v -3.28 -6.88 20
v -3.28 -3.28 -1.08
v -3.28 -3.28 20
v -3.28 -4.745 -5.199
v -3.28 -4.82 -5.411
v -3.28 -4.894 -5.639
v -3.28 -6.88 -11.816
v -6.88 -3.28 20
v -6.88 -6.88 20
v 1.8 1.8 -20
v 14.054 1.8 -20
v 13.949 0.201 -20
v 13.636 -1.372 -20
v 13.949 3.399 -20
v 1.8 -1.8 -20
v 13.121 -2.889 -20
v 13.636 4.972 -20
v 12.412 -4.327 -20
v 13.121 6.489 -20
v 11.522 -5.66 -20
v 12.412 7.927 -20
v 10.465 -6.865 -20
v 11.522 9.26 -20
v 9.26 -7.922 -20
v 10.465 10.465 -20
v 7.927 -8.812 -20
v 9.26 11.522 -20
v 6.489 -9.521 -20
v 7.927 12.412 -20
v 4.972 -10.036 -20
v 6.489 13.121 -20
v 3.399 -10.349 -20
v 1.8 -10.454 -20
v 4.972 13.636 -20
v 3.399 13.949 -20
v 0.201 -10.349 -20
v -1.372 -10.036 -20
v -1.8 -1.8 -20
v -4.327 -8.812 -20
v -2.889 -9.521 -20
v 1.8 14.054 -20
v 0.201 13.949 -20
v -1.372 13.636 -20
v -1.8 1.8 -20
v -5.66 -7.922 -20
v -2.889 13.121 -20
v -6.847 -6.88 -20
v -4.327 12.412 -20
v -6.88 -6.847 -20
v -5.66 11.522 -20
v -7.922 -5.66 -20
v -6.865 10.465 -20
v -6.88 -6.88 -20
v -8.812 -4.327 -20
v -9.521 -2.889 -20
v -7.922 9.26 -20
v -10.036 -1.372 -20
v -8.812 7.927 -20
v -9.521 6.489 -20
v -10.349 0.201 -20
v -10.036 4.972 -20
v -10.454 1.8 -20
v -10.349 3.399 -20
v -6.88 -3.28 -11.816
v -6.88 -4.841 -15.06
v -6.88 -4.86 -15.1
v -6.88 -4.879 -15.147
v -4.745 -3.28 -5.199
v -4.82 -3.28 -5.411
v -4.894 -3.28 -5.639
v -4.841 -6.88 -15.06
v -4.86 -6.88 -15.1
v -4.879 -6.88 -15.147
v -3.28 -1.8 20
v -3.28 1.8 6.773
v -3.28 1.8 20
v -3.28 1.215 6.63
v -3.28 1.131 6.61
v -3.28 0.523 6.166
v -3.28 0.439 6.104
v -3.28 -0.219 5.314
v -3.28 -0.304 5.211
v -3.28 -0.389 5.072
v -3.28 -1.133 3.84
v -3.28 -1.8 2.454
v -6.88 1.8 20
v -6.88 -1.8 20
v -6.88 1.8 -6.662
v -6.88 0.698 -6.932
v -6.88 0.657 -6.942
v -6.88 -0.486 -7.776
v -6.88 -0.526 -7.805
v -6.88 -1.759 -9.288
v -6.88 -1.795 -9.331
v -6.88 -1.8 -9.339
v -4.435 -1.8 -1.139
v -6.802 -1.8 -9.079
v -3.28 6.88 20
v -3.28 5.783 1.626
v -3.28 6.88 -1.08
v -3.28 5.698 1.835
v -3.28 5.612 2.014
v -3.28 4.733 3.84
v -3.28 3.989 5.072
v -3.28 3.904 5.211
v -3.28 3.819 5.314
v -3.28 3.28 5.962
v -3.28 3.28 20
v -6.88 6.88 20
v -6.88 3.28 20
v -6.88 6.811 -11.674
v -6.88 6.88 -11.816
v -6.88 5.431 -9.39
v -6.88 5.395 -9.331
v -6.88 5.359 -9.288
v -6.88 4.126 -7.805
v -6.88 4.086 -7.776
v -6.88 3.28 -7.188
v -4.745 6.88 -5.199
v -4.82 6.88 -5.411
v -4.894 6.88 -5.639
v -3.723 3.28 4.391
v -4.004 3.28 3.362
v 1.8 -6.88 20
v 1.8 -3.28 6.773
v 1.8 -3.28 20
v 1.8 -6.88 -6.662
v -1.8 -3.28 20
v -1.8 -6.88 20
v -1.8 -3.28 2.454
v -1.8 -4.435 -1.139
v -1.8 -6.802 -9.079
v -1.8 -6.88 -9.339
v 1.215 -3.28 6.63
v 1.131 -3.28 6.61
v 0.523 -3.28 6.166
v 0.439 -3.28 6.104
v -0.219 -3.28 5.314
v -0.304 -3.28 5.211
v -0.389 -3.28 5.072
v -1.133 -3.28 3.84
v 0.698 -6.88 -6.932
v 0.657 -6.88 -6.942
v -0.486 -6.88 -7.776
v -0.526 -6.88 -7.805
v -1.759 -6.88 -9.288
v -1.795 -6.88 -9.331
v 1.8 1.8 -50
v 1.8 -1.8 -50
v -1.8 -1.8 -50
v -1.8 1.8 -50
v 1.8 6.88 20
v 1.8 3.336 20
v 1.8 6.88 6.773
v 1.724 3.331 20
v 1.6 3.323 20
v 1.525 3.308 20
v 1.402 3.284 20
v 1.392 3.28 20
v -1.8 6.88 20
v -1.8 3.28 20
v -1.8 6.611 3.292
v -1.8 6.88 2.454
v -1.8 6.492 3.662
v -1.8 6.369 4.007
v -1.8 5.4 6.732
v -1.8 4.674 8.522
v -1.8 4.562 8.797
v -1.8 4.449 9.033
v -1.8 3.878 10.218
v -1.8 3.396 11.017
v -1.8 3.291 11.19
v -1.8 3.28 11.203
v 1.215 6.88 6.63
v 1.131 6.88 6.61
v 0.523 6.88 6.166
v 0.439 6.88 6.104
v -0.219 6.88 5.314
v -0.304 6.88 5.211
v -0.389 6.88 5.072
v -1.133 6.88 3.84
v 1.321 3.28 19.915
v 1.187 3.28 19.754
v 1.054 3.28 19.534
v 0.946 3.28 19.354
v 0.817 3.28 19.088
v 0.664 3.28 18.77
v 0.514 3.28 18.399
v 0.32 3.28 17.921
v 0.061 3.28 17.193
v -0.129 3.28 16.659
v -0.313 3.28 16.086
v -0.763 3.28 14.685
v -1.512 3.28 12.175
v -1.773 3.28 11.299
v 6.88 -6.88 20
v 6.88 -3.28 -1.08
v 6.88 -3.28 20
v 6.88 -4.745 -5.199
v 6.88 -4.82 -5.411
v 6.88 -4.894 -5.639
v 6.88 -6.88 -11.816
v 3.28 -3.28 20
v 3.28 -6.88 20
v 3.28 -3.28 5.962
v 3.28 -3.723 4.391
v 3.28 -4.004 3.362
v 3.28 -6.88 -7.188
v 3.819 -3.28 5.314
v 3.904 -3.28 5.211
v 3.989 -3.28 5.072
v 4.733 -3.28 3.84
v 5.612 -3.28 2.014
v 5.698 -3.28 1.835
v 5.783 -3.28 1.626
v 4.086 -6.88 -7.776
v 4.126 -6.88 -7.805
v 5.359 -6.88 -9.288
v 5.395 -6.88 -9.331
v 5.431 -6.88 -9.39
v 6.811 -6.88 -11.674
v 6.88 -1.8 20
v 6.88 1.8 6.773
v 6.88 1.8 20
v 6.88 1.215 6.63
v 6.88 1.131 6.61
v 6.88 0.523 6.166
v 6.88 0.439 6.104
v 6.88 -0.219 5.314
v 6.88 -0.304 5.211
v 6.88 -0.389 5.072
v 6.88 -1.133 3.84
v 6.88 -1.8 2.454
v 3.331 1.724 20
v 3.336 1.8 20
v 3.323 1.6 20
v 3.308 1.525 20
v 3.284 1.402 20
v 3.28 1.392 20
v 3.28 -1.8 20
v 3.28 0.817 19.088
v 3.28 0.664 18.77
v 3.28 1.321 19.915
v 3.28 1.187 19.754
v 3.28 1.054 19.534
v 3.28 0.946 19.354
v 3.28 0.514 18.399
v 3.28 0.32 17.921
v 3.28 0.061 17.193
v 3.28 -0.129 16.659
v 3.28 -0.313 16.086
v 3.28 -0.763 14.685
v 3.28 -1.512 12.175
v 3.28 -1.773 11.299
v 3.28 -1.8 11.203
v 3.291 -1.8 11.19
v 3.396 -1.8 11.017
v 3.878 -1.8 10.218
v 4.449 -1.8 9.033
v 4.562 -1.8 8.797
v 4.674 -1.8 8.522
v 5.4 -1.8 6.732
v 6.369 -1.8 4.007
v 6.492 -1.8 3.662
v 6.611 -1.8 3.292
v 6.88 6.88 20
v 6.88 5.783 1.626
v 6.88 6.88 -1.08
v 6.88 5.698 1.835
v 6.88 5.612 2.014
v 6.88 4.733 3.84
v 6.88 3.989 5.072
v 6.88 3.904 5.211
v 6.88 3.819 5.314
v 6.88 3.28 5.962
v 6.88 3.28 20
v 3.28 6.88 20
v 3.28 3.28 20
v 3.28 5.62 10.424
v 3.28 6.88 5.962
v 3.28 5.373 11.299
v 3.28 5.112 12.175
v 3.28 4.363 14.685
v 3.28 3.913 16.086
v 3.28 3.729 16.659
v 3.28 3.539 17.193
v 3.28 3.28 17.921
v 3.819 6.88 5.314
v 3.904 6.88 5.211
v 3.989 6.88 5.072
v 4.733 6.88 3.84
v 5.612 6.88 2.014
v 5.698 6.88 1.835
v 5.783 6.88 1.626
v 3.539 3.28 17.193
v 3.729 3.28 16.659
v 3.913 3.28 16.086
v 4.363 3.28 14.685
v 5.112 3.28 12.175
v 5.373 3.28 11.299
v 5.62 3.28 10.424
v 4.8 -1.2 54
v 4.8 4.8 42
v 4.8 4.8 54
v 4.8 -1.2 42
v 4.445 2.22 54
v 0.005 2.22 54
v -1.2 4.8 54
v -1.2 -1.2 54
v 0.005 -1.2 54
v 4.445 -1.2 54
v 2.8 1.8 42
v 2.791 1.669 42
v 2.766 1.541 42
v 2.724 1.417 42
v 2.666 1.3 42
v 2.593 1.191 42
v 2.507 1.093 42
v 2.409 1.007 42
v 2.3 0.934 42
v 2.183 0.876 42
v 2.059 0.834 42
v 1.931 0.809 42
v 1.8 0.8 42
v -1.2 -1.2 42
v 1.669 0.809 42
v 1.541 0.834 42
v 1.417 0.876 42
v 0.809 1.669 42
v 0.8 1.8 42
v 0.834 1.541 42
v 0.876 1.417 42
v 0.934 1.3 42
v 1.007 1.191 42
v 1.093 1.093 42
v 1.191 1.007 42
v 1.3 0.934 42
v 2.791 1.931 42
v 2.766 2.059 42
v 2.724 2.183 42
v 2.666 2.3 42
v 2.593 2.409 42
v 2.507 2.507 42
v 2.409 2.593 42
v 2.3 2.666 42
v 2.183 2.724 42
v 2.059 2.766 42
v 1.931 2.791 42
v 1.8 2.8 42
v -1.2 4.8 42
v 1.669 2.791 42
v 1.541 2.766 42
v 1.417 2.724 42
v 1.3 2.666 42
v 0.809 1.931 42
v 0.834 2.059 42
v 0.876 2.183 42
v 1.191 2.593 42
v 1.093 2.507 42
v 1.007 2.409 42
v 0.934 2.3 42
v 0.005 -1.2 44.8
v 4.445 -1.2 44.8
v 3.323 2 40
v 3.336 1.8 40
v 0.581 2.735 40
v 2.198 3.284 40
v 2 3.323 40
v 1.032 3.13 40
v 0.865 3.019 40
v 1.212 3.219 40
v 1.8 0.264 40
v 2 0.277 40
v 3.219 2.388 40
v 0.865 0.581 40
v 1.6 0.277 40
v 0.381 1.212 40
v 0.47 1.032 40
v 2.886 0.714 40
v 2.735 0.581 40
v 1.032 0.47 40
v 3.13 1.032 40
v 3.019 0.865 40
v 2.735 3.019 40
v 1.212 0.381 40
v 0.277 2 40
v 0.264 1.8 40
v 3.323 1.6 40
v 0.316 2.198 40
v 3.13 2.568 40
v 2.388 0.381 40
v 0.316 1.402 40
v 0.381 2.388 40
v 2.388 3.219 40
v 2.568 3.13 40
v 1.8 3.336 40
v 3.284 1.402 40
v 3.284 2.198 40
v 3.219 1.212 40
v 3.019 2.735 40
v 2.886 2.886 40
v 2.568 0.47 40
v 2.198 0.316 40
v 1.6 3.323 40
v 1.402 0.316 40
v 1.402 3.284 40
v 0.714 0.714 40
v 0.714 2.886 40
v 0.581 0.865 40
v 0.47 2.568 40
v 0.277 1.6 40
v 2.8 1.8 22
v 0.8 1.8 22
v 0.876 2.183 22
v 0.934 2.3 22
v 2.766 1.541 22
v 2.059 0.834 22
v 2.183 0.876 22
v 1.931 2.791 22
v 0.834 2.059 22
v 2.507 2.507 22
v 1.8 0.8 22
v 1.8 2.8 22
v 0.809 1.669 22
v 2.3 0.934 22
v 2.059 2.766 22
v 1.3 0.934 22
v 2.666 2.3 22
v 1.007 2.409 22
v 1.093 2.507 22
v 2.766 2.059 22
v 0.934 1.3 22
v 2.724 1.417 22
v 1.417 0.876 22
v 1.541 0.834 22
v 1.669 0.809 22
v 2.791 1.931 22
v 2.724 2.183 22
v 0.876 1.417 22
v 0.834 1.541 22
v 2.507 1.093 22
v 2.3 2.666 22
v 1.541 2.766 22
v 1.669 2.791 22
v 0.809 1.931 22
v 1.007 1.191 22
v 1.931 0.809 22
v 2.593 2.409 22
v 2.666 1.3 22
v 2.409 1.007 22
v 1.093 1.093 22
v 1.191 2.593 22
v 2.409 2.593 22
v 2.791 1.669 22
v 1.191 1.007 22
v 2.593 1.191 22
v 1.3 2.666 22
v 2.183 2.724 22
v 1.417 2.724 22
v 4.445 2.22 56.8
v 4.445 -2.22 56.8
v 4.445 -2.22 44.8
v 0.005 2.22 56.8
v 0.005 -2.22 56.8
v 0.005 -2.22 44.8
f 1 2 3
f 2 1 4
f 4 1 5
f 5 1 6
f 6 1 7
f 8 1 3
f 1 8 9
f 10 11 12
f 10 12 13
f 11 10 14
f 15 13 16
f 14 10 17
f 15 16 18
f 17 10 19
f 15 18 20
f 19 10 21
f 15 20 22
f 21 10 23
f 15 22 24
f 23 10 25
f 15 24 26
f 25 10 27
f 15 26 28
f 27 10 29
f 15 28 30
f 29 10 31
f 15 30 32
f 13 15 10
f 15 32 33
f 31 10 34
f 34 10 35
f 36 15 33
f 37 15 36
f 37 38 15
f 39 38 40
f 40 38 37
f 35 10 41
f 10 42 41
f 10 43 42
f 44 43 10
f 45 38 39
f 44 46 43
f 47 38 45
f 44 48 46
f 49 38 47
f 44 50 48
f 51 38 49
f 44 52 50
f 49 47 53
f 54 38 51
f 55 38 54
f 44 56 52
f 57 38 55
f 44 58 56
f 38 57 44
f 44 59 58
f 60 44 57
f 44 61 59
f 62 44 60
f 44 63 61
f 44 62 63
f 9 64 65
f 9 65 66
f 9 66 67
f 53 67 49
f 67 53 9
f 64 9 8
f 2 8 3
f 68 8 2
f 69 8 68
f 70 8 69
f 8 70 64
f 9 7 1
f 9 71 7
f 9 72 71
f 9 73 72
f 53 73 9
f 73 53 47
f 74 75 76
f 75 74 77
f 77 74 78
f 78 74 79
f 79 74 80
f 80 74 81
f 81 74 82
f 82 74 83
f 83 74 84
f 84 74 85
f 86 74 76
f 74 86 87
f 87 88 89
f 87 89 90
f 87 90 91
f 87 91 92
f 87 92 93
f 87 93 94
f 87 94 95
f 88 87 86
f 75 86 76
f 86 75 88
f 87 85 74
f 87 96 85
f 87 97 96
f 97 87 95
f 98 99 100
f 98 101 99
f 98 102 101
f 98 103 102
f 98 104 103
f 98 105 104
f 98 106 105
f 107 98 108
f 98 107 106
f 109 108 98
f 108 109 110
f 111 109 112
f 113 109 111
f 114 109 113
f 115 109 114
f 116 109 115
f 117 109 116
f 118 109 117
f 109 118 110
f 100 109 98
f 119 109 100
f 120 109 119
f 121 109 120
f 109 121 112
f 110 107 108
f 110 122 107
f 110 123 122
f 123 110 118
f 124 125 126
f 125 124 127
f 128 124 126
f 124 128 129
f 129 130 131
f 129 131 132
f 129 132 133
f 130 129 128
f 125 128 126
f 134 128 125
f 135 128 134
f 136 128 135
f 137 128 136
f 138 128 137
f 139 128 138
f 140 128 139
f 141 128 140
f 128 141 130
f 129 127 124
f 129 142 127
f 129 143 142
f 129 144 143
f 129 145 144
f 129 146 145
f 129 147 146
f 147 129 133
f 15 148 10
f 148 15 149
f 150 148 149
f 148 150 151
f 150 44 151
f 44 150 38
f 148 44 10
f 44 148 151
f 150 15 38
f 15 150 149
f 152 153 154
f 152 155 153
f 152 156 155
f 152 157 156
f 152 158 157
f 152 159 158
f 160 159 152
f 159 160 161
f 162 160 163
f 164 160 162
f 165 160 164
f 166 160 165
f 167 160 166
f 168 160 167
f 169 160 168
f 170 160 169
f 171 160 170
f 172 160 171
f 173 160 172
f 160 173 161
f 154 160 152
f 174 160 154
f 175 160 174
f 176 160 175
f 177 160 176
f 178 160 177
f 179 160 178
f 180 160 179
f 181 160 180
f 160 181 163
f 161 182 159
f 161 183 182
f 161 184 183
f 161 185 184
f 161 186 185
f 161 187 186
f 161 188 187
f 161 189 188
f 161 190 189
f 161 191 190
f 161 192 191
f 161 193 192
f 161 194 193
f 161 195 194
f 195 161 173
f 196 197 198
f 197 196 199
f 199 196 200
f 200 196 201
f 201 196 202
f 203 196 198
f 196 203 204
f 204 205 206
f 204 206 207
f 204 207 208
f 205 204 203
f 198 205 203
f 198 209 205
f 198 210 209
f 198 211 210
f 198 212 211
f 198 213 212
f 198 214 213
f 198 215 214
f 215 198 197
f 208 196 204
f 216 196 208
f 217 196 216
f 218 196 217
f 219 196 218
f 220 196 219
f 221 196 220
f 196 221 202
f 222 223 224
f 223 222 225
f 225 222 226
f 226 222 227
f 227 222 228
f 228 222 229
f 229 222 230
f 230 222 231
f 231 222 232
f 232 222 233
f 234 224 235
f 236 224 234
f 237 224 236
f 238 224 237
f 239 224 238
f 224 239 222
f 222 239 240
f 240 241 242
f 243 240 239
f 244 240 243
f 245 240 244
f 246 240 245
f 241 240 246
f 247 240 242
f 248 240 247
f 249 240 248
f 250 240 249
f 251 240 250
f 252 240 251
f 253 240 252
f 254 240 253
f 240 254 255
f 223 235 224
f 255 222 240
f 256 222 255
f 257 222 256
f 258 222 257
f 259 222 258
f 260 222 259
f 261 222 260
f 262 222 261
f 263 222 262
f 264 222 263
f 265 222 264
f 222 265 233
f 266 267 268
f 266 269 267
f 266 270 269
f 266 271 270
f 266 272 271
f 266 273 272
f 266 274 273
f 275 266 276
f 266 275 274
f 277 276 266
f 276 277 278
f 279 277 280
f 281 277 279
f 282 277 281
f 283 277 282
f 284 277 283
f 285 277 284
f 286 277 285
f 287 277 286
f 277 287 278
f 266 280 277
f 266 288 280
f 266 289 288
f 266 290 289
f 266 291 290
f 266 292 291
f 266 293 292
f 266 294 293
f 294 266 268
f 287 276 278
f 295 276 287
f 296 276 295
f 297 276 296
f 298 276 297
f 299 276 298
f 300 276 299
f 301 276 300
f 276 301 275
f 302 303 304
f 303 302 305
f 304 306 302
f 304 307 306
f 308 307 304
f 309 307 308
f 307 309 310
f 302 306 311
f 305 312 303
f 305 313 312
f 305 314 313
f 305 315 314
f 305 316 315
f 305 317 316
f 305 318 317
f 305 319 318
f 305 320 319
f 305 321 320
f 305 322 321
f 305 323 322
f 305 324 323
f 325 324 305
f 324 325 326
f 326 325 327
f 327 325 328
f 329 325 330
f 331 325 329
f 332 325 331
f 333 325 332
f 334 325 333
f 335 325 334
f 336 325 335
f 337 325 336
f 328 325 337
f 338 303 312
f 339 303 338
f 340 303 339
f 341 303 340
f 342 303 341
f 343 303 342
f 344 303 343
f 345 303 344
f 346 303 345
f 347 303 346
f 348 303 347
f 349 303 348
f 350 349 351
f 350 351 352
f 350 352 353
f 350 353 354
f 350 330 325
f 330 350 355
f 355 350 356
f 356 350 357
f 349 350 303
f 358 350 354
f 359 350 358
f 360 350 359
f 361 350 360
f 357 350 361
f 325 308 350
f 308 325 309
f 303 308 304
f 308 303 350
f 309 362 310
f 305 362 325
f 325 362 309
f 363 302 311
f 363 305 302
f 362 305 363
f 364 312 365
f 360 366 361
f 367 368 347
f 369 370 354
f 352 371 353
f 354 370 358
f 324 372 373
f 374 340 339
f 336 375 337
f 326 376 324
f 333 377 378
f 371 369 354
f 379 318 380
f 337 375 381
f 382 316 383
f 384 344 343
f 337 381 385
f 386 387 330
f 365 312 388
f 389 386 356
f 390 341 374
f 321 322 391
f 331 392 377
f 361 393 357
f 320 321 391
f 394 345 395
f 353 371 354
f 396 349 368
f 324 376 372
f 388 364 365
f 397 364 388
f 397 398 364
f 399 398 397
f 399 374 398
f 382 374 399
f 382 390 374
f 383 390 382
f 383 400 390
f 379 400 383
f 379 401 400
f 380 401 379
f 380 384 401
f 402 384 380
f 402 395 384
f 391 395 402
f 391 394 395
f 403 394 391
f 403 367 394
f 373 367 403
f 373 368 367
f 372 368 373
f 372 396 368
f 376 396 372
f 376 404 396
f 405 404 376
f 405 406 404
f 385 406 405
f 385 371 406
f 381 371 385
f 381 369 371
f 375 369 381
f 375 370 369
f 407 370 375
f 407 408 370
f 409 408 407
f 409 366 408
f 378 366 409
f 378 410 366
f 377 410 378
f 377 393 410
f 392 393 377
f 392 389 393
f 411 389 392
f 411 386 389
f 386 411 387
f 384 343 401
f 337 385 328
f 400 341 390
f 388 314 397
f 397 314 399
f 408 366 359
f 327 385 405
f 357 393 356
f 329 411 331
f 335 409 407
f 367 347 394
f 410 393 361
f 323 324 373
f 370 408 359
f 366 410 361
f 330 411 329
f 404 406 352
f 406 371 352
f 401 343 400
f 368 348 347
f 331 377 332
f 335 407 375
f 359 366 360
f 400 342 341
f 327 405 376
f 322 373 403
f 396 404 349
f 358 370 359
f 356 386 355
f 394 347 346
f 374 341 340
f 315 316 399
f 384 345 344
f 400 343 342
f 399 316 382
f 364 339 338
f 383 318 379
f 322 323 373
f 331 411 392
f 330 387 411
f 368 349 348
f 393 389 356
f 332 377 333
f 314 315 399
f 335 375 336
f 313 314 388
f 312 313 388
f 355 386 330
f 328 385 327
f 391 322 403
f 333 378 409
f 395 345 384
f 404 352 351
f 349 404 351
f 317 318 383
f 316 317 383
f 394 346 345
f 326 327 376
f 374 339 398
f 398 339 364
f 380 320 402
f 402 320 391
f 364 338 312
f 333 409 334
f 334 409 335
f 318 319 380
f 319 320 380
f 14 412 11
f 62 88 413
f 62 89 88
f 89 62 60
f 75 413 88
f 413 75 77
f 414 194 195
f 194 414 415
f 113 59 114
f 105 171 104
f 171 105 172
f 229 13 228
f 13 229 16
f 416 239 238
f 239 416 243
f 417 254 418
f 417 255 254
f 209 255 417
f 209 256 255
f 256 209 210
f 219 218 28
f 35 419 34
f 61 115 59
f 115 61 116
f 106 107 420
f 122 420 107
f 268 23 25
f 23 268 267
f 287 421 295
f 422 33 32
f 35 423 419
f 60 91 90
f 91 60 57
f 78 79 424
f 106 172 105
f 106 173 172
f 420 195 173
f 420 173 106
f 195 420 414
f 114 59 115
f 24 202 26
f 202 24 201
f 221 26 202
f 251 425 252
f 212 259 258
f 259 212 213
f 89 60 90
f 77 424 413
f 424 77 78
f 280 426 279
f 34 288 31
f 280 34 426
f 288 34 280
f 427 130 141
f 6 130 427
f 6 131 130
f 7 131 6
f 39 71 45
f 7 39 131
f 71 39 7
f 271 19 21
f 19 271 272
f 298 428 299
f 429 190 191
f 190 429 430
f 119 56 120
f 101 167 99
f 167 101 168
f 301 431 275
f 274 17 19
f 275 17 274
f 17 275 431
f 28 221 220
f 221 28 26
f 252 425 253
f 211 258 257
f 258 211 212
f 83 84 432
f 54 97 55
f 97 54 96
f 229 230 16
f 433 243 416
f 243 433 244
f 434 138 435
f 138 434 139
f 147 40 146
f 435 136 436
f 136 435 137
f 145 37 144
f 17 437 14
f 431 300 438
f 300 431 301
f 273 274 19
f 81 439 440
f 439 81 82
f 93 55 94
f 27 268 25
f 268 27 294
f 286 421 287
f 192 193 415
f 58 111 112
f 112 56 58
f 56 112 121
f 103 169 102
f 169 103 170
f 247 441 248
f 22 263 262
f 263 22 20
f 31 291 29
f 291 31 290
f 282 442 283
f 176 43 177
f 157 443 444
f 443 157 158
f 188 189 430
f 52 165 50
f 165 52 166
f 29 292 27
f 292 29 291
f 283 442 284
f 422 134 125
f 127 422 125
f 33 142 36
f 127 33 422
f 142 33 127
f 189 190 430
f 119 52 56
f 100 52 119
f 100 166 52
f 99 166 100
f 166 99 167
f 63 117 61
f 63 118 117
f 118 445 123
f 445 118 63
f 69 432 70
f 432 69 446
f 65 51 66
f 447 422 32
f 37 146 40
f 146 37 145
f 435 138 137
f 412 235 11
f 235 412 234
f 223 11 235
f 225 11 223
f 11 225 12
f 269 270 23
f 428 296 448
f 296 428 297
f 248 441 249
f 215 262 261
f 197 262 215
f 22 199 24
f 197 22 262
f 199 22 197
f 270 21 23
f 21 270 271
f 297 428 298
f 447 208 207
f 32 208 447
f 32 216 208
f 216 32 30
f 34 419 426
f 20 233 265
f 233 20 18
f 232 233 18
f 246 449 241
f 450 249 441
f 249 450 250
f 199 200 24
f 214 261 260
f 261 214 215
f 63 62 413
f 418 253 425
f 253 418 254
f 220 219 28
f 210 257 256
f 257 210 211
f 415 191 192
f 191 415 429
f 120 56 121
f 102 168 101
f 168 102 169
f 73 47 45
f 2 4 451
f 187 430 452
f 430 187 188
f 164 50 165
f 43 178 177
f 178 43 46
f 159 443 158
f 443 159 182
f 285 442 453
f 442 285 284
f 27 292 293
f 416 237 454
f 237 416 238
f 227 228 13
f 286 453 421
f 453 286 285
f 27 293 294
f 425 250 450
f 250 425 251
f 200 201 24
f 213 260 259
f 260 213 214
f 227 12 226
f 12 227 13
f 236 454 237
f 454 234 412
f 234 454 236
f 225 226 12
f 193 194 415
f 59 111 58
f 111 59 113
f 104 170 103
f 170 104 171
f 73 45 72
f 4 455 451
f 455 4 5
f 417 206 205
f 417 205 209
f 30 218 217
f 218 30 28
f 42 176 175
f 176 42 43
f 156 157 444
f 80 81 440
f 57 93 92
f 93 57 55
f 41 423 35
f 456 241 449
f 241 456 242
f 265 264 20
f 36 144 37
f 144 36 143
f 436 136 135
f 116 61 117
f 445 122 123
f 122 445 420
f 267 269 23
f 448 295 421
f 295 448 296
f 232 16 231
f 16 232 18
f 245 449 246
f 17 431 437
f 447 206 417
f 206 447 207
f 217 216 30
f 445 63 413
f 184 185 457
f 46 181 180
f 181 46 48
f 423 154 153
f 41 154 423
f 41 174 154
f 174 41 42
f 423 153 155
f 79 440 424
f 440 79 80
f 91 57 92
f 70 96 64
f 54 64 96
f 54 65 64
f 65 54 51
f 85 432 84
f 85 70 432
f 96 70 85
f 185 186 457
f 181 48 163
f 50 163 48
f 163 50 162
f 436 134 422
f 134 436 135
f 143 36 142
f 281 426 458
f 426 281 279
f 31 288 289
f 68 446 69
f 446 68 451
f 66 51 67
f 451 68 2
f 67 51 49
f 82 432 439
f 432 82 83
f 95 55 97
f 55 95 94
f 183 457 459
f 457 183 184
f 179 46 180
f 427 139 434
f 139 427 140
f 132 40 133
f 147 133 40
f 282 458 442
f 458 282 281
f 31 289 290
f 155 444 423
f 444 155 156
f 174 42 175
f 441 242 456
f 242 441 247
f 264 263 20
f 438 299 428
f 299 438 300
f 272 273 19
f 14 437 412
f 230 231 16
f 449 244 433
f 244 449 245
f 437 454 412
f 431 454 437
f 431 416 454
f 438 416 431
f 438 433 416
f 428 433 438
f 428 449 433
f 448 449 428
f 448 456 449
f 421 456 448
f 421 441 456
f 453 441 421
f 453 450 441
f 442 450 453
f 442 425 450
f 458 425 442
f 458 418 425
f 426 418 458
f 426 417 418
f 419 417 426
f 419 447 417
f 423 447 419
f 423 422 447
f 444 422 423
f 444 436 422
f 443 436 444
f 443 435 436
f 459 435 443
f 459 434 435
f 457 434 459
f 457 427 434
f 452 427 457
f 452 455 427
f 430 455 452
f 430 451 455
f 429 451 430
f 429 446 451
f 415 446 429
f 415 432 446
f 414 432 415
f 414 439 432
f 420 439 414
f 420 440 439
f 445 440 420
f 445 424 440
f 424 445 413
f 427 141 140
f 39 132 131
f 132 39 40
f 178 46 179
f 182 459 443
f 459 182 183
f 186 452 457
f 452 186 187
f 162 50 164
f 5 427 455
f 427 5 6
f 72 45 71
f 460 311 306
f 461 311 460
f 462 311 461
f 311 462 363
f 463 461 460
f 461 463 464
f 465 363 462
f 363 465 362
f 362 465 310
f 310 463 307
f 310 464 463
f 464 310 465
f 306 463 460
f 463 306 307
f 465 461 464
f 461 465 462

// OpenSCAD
// design calculation + design calculation — A1 reader-head optical geometry at the 5.08 mm pitch
// (real OpenSCAD)
//
// Bounds the SINGLE-CELL READ RESOLUTION question from CAD + geometry:
// can one wrong cell among 6,400 be distinguished from its neighbours?
//
// design calculation CORRECTION (from the design calculation audit). The reader head sits above the
// column tops at a working gap g. A single interrogation aperture of diameter
// d emits at half-angle theta. design calculation computed ONE spot at ONE 2 mm gap and
// called it "the single-cell read". That is the UP-state spot only: the A1
// state is the column-top HEIGHT, so over a DOWN cell the reflective target is
// TRAVEL = 40 mm lower and the interrogated gap is ~42 mm, giving a ~24.5 mm
// spot (4.82 pitches). At that standoff the four up neighbours dominate the
// pocket return by ~441x, so a down cell reads UP — a silent wrong-cell
// failure. The read is NOT single-cell for the down half of the states, and
// the binding limit is the STATE-DEPENDENT STANDOFF, not a gantry registration
// tolerance.
//
// This file renders the worst case (aperture centred on a CELL CORNER) and
// echoes both states so the defect is visible in the render record. It also
// models the design calculation PROPOSED fix: a reflective flag on the frame-anchored
// latch hinge, read at ONE standoff for both states (a common-height target).
//
// EVIDENCE CLASS: CAD geometry only. No print, no measurement (design calculation).
//
// Geometry from the placed cell CAD (a1_binary_latch_cell.scad):
//   PITCH = 5.08, BODY (column top face) = 3.60, lane = 0.74 each side.

PITCH      = 5.08;
BODY       = 3.60;         // column top face (square)
TRAVEL     = 40.0;         // column top at full up = 40 mm
OWNED_LANE = PITCH/2 - BODY/2;   // 0.74 mm

WORK_GAP   = 2.0;          // reader-to-UP-top working gap (assumption-class)
APERTURE   = 2.0;          // single-cell interrogation aperture (assumption-class)
HALF_ANGLE = 15.0;         // emission half-angle (deg)
$fn = 48;

// Spot diameter where the center ray meets the target plane:
//   spot = aperture + 2 * gap * tan(half_angle)
function spot_d(gap, d, ha) = d + 2*gap*tan(ha);
SPOT_UP   = spot_d(WORK_GAP, APERTURE, HALF_ANGLE);
SPOT_DOWN = spot_d(WORK_GAP + TRAVEL, APERTURE, HALF_ANGLE);

// design calculation: the true worst-case reach is with the aperture genuinely at the CELL
// CORNER. The farthest spot point from the cell centre is the corner radius
// sqrt((BODY/2)^2 + (BODY/2)^2) plus the spot radius. design calculation's
// `spot/2*sqrt(2)` was a CENTRED aperture with a diagonal spot and understated
// the reach by ~1.9 mm.
CORNER_HYP   = sqrt((BODY/2)*(BODY/2) + (BODY/2)*(BODY/2));   // 2.546 mm
CORNER_REACH = CORNER_HYP + SPOT_UP/2;                         // 4.081 mm

// design calculation: the physical crosstalk threshold is the NEIGHBOUR's near edge, not
// the own top-face edge (design calculation R3).
NEIGHBOUR_NEAR_EDGE = PITCH - BODY/2;                          // 3.28 mm
SPOT_CONTAMINATES = SPOT_UP/2 > NEIGHBOUR_NEAR_EDGE;

module column_up() {
    color("SteelBlue")
        translate([0, 0, TRAVEL/2 - 20])
            cube([BODY, BODY, TRAVEL], center=true);
}

module column_down() {
    color("DimGray")
        translate([0, 0, -10 - 20])
            cube([BODY, BODY, TRAVEL], center=true);
}

module reader_head() {
    // the reader head body (orange) with the interrogation aperture (yellow)
    translate([0, 0, TRAVEL + WORK_GAP + 6])
        color("Orange") cube([APERTURE + 4, APERTURE + 4, 12], center=true);
    // the cone from the aperture to the UP target top face (green: fits)
    translate([0, 0, TRAVEL + WORK_GAP/2])
        color("Gold", 0.35)
            cylinder(h = WORK_GAP, d1 = SPOT_UP, d2 = APERTURE, center=true);
}

module down_state_cone() {
    // design calculation: the same aperture aimed 40 mm lower over a DOWN cell. The
    // resulting cone is a ~24.5 mm spot that covers the whole 3x3 patch — the
    // silent-crosstalk failure the audit found.
    translate([0, 0, WORK_GAP/2])
        color("Red", 0.22)
            cylinder(h = WORK_GAP + TRAVEL, d1 = SPOT_DOWN, d2 = APERTURE,
                     center=true);
}

module neighbour_patch() {
    // a 3x3 patch with the CENTRE cell DOWN (the wrong cell) and neighbours UP
    for (i = [-1, 0, 1])
        for (j = [-1, 0, 1]) {
            x = i*PITCH; y = j*PITCH;
            if (i == 0 && j == 0) translate([x, y, 0]) column_down();
            else translate([x, y, 0]) column_up();
        }
}

module common_height_flag() {
    // design calculation PROPOSED fix: a reflective flag on the frame-anchored latch hinge,
    // read at ONE standoff for both states.
    // ---------------------------------------------------------------------
    // design calculation STATUS: this is now a VALIDATED-ARTIFACT read target, not a
    // schematic. The flag is the CH-A frame-fixed vane from
    // `a1_binary_latch_cell.scad`: a post in the latch lane with its top face
    // at a single fixed z for both column states (DeltaZ = 0 by construction).
    // The reader rides at a FIXED standoff above the flag plane; the neighbour
    // columns sit at x >= PITCH - BODY/2, so only the X half-width of the spot
    // can reach them. See the self-checks below.
    translate([FLAG_X, 0, FLAG_Z_TOP - FLAG_H/2])
        color("Gold") cube([FLAG_T, FLAG_W, FLAG_H], center=true);
    translate([FLAG_X, 0, FLAG_Z_TOP + 0.01])
        color("Khaki") cube([FLAG_T, FLAG_W, 0.02], center=true);
}

module flag_reader_head() {
    // design calculation: the reader head fixed above the flag plane at ONE standoff.
    // A dedicated SMALL aperture (FLAG_AP=0.60 mm) and tight standoff
    // (FLAG_GAP=1.0 mm) keep the spot off the neighbour body; the spot may
    // spread in Y because the lane is open across the full pitch.
    translate([FLAG_X, 0, FLAG_Z_TOP + FLAG_GAP + 6])
        color("Orange") cube([FLAG_AP + 4, FLAG_AP + 4, 12], center=true);
    // cone from the aperture to the frame-fixed flag top face (green: fits)
    translate([FLAG_X, 0, FLAG_Z_TOP + FLAG_GAP/2])
        color("LimeGreen", 0.30)
            cylinder(h = FLAG_GAP,
                     d1 = FLAG_AP + 2*FLAG_GAP*tan(HALF_ANGLE),
                     d2 = FLAG_AP, center=true);
}

module assembly() {
    neighbour_patch();
    // aperture centred over the CENTRE cell corner (worst-case straddle)
    translate([BODY/2, BODY/2, 0]) {
        reader_head();
        down_state_cone();
    }
    // design calculation: the common-height flag target read at its own fixed standoff.
    common_height_flag();
    translate([0, 0, 0]) flag_reader_head();
}

assembly();

// ---- self-checks (echoed, captured by the render tool) ---------------------
echo(str("PITCH=", PITCH, " BODY=", BODY, " OWNED_LANE=", OWNED_LANE));
echo(str("WORK_GAP=", WORK_GAP, " APERTURE=", APERTURE, " HALF_ANGLE=", HALF_ANGLE));
echo(str("SPOT_UP_diameter=", SPOT_UP));
echo(str("SPOT_DOWN_diameter=", SPOT_DOWN, " = ", SPOT_DOWN/PITCH, " pitches"));
echo(str("CORNER_HYP=", CORNER_HYP, " CORNER_REACH_corrected=", CORNER_REACH));
echo(str("NEIGHBOUR_NEAR_EDGE=", NEIGHBOUR_NEAR_EDGE, " SPOT_CONTAMINATES=", SPOT_CONTAMINATES));
echo(str("spot fits top face at centre: ", (SPOT_UP/2) <= BODY/2));
echo(str("down-state single-cell read resolvable: ", SPOT_DOWN <= BODY));
echo(str("gap for centre fit: ", (BODY - APERTURE)/(2*tan(HALF_ANGLE))));

// ---- design calculation common-height target read self-checks -------------------------
FLAG_X       = BODY/2 + 0.45/2 + 0.20;     // HINGE_X, frame-fixed lane
FLAG_T       = 0.44;                       // flag width in X
FLAG_W       = 1.60;                       // flag width in Y
FLAG_H       = 0.80;
FLAG_Z_TOP   = TRAVEL + 3.0;               // fixed target top face z
// design calculation REVISION: the shutter flap needs a tolerance-robust window between the
// vane top and the reader aperture plane, so the fixed standoff is raised
// 1.0 -> 1.8 mm and the aperture is set to 0.44 mm (1 line).
FLAG_GAP     = 1.8;                        // fixed reader-to-flag standoff
FLAG_AP      = 0.44;                       // dedicated small flag-read aperture
FLAG_SPOT_X  = FLAG_AP + 2*FLAG_GAP*tan(HALF_ANGLE);  // spot width in X = 1.405
FLAG_SPOT_Y  = FLAG_SPOT_X;                // same formula, Y is open
X_CLEAR_NB   = PITCH - BODY/2 - FLAG_X;    // to the neighbour body
FLAG_SPOT_CLEARS_NB = (FLAG_SPOT_X/2) <= X_CLEAR_NB;
FLAG_SPOT_FITS_Y    = FLAG_SPOT_X <= FLAG_W;
echo(str("FLAG_X=", FLAG_X, " Z_FLAG_TOP=", FLAG_Z_TOP,
         " (frame-fixed; DeltaZ=0 for both states)"));
echo(str("FLAG_GAP=", FLAG_GAP, " FLAG_AP=", FLAG_AP,
         " FLAG_SPOT_X=", FLAG_SPOT_X, " X_CLEAR_NB=", X_CLEAR_NB));
echo(str("flag spot clears neighbour body: ", FLAG_SPOT_CLEARS_NB));
echo(str("flag spot fits flag Y width: ", FLAG_SPOT_FITS_Y));
